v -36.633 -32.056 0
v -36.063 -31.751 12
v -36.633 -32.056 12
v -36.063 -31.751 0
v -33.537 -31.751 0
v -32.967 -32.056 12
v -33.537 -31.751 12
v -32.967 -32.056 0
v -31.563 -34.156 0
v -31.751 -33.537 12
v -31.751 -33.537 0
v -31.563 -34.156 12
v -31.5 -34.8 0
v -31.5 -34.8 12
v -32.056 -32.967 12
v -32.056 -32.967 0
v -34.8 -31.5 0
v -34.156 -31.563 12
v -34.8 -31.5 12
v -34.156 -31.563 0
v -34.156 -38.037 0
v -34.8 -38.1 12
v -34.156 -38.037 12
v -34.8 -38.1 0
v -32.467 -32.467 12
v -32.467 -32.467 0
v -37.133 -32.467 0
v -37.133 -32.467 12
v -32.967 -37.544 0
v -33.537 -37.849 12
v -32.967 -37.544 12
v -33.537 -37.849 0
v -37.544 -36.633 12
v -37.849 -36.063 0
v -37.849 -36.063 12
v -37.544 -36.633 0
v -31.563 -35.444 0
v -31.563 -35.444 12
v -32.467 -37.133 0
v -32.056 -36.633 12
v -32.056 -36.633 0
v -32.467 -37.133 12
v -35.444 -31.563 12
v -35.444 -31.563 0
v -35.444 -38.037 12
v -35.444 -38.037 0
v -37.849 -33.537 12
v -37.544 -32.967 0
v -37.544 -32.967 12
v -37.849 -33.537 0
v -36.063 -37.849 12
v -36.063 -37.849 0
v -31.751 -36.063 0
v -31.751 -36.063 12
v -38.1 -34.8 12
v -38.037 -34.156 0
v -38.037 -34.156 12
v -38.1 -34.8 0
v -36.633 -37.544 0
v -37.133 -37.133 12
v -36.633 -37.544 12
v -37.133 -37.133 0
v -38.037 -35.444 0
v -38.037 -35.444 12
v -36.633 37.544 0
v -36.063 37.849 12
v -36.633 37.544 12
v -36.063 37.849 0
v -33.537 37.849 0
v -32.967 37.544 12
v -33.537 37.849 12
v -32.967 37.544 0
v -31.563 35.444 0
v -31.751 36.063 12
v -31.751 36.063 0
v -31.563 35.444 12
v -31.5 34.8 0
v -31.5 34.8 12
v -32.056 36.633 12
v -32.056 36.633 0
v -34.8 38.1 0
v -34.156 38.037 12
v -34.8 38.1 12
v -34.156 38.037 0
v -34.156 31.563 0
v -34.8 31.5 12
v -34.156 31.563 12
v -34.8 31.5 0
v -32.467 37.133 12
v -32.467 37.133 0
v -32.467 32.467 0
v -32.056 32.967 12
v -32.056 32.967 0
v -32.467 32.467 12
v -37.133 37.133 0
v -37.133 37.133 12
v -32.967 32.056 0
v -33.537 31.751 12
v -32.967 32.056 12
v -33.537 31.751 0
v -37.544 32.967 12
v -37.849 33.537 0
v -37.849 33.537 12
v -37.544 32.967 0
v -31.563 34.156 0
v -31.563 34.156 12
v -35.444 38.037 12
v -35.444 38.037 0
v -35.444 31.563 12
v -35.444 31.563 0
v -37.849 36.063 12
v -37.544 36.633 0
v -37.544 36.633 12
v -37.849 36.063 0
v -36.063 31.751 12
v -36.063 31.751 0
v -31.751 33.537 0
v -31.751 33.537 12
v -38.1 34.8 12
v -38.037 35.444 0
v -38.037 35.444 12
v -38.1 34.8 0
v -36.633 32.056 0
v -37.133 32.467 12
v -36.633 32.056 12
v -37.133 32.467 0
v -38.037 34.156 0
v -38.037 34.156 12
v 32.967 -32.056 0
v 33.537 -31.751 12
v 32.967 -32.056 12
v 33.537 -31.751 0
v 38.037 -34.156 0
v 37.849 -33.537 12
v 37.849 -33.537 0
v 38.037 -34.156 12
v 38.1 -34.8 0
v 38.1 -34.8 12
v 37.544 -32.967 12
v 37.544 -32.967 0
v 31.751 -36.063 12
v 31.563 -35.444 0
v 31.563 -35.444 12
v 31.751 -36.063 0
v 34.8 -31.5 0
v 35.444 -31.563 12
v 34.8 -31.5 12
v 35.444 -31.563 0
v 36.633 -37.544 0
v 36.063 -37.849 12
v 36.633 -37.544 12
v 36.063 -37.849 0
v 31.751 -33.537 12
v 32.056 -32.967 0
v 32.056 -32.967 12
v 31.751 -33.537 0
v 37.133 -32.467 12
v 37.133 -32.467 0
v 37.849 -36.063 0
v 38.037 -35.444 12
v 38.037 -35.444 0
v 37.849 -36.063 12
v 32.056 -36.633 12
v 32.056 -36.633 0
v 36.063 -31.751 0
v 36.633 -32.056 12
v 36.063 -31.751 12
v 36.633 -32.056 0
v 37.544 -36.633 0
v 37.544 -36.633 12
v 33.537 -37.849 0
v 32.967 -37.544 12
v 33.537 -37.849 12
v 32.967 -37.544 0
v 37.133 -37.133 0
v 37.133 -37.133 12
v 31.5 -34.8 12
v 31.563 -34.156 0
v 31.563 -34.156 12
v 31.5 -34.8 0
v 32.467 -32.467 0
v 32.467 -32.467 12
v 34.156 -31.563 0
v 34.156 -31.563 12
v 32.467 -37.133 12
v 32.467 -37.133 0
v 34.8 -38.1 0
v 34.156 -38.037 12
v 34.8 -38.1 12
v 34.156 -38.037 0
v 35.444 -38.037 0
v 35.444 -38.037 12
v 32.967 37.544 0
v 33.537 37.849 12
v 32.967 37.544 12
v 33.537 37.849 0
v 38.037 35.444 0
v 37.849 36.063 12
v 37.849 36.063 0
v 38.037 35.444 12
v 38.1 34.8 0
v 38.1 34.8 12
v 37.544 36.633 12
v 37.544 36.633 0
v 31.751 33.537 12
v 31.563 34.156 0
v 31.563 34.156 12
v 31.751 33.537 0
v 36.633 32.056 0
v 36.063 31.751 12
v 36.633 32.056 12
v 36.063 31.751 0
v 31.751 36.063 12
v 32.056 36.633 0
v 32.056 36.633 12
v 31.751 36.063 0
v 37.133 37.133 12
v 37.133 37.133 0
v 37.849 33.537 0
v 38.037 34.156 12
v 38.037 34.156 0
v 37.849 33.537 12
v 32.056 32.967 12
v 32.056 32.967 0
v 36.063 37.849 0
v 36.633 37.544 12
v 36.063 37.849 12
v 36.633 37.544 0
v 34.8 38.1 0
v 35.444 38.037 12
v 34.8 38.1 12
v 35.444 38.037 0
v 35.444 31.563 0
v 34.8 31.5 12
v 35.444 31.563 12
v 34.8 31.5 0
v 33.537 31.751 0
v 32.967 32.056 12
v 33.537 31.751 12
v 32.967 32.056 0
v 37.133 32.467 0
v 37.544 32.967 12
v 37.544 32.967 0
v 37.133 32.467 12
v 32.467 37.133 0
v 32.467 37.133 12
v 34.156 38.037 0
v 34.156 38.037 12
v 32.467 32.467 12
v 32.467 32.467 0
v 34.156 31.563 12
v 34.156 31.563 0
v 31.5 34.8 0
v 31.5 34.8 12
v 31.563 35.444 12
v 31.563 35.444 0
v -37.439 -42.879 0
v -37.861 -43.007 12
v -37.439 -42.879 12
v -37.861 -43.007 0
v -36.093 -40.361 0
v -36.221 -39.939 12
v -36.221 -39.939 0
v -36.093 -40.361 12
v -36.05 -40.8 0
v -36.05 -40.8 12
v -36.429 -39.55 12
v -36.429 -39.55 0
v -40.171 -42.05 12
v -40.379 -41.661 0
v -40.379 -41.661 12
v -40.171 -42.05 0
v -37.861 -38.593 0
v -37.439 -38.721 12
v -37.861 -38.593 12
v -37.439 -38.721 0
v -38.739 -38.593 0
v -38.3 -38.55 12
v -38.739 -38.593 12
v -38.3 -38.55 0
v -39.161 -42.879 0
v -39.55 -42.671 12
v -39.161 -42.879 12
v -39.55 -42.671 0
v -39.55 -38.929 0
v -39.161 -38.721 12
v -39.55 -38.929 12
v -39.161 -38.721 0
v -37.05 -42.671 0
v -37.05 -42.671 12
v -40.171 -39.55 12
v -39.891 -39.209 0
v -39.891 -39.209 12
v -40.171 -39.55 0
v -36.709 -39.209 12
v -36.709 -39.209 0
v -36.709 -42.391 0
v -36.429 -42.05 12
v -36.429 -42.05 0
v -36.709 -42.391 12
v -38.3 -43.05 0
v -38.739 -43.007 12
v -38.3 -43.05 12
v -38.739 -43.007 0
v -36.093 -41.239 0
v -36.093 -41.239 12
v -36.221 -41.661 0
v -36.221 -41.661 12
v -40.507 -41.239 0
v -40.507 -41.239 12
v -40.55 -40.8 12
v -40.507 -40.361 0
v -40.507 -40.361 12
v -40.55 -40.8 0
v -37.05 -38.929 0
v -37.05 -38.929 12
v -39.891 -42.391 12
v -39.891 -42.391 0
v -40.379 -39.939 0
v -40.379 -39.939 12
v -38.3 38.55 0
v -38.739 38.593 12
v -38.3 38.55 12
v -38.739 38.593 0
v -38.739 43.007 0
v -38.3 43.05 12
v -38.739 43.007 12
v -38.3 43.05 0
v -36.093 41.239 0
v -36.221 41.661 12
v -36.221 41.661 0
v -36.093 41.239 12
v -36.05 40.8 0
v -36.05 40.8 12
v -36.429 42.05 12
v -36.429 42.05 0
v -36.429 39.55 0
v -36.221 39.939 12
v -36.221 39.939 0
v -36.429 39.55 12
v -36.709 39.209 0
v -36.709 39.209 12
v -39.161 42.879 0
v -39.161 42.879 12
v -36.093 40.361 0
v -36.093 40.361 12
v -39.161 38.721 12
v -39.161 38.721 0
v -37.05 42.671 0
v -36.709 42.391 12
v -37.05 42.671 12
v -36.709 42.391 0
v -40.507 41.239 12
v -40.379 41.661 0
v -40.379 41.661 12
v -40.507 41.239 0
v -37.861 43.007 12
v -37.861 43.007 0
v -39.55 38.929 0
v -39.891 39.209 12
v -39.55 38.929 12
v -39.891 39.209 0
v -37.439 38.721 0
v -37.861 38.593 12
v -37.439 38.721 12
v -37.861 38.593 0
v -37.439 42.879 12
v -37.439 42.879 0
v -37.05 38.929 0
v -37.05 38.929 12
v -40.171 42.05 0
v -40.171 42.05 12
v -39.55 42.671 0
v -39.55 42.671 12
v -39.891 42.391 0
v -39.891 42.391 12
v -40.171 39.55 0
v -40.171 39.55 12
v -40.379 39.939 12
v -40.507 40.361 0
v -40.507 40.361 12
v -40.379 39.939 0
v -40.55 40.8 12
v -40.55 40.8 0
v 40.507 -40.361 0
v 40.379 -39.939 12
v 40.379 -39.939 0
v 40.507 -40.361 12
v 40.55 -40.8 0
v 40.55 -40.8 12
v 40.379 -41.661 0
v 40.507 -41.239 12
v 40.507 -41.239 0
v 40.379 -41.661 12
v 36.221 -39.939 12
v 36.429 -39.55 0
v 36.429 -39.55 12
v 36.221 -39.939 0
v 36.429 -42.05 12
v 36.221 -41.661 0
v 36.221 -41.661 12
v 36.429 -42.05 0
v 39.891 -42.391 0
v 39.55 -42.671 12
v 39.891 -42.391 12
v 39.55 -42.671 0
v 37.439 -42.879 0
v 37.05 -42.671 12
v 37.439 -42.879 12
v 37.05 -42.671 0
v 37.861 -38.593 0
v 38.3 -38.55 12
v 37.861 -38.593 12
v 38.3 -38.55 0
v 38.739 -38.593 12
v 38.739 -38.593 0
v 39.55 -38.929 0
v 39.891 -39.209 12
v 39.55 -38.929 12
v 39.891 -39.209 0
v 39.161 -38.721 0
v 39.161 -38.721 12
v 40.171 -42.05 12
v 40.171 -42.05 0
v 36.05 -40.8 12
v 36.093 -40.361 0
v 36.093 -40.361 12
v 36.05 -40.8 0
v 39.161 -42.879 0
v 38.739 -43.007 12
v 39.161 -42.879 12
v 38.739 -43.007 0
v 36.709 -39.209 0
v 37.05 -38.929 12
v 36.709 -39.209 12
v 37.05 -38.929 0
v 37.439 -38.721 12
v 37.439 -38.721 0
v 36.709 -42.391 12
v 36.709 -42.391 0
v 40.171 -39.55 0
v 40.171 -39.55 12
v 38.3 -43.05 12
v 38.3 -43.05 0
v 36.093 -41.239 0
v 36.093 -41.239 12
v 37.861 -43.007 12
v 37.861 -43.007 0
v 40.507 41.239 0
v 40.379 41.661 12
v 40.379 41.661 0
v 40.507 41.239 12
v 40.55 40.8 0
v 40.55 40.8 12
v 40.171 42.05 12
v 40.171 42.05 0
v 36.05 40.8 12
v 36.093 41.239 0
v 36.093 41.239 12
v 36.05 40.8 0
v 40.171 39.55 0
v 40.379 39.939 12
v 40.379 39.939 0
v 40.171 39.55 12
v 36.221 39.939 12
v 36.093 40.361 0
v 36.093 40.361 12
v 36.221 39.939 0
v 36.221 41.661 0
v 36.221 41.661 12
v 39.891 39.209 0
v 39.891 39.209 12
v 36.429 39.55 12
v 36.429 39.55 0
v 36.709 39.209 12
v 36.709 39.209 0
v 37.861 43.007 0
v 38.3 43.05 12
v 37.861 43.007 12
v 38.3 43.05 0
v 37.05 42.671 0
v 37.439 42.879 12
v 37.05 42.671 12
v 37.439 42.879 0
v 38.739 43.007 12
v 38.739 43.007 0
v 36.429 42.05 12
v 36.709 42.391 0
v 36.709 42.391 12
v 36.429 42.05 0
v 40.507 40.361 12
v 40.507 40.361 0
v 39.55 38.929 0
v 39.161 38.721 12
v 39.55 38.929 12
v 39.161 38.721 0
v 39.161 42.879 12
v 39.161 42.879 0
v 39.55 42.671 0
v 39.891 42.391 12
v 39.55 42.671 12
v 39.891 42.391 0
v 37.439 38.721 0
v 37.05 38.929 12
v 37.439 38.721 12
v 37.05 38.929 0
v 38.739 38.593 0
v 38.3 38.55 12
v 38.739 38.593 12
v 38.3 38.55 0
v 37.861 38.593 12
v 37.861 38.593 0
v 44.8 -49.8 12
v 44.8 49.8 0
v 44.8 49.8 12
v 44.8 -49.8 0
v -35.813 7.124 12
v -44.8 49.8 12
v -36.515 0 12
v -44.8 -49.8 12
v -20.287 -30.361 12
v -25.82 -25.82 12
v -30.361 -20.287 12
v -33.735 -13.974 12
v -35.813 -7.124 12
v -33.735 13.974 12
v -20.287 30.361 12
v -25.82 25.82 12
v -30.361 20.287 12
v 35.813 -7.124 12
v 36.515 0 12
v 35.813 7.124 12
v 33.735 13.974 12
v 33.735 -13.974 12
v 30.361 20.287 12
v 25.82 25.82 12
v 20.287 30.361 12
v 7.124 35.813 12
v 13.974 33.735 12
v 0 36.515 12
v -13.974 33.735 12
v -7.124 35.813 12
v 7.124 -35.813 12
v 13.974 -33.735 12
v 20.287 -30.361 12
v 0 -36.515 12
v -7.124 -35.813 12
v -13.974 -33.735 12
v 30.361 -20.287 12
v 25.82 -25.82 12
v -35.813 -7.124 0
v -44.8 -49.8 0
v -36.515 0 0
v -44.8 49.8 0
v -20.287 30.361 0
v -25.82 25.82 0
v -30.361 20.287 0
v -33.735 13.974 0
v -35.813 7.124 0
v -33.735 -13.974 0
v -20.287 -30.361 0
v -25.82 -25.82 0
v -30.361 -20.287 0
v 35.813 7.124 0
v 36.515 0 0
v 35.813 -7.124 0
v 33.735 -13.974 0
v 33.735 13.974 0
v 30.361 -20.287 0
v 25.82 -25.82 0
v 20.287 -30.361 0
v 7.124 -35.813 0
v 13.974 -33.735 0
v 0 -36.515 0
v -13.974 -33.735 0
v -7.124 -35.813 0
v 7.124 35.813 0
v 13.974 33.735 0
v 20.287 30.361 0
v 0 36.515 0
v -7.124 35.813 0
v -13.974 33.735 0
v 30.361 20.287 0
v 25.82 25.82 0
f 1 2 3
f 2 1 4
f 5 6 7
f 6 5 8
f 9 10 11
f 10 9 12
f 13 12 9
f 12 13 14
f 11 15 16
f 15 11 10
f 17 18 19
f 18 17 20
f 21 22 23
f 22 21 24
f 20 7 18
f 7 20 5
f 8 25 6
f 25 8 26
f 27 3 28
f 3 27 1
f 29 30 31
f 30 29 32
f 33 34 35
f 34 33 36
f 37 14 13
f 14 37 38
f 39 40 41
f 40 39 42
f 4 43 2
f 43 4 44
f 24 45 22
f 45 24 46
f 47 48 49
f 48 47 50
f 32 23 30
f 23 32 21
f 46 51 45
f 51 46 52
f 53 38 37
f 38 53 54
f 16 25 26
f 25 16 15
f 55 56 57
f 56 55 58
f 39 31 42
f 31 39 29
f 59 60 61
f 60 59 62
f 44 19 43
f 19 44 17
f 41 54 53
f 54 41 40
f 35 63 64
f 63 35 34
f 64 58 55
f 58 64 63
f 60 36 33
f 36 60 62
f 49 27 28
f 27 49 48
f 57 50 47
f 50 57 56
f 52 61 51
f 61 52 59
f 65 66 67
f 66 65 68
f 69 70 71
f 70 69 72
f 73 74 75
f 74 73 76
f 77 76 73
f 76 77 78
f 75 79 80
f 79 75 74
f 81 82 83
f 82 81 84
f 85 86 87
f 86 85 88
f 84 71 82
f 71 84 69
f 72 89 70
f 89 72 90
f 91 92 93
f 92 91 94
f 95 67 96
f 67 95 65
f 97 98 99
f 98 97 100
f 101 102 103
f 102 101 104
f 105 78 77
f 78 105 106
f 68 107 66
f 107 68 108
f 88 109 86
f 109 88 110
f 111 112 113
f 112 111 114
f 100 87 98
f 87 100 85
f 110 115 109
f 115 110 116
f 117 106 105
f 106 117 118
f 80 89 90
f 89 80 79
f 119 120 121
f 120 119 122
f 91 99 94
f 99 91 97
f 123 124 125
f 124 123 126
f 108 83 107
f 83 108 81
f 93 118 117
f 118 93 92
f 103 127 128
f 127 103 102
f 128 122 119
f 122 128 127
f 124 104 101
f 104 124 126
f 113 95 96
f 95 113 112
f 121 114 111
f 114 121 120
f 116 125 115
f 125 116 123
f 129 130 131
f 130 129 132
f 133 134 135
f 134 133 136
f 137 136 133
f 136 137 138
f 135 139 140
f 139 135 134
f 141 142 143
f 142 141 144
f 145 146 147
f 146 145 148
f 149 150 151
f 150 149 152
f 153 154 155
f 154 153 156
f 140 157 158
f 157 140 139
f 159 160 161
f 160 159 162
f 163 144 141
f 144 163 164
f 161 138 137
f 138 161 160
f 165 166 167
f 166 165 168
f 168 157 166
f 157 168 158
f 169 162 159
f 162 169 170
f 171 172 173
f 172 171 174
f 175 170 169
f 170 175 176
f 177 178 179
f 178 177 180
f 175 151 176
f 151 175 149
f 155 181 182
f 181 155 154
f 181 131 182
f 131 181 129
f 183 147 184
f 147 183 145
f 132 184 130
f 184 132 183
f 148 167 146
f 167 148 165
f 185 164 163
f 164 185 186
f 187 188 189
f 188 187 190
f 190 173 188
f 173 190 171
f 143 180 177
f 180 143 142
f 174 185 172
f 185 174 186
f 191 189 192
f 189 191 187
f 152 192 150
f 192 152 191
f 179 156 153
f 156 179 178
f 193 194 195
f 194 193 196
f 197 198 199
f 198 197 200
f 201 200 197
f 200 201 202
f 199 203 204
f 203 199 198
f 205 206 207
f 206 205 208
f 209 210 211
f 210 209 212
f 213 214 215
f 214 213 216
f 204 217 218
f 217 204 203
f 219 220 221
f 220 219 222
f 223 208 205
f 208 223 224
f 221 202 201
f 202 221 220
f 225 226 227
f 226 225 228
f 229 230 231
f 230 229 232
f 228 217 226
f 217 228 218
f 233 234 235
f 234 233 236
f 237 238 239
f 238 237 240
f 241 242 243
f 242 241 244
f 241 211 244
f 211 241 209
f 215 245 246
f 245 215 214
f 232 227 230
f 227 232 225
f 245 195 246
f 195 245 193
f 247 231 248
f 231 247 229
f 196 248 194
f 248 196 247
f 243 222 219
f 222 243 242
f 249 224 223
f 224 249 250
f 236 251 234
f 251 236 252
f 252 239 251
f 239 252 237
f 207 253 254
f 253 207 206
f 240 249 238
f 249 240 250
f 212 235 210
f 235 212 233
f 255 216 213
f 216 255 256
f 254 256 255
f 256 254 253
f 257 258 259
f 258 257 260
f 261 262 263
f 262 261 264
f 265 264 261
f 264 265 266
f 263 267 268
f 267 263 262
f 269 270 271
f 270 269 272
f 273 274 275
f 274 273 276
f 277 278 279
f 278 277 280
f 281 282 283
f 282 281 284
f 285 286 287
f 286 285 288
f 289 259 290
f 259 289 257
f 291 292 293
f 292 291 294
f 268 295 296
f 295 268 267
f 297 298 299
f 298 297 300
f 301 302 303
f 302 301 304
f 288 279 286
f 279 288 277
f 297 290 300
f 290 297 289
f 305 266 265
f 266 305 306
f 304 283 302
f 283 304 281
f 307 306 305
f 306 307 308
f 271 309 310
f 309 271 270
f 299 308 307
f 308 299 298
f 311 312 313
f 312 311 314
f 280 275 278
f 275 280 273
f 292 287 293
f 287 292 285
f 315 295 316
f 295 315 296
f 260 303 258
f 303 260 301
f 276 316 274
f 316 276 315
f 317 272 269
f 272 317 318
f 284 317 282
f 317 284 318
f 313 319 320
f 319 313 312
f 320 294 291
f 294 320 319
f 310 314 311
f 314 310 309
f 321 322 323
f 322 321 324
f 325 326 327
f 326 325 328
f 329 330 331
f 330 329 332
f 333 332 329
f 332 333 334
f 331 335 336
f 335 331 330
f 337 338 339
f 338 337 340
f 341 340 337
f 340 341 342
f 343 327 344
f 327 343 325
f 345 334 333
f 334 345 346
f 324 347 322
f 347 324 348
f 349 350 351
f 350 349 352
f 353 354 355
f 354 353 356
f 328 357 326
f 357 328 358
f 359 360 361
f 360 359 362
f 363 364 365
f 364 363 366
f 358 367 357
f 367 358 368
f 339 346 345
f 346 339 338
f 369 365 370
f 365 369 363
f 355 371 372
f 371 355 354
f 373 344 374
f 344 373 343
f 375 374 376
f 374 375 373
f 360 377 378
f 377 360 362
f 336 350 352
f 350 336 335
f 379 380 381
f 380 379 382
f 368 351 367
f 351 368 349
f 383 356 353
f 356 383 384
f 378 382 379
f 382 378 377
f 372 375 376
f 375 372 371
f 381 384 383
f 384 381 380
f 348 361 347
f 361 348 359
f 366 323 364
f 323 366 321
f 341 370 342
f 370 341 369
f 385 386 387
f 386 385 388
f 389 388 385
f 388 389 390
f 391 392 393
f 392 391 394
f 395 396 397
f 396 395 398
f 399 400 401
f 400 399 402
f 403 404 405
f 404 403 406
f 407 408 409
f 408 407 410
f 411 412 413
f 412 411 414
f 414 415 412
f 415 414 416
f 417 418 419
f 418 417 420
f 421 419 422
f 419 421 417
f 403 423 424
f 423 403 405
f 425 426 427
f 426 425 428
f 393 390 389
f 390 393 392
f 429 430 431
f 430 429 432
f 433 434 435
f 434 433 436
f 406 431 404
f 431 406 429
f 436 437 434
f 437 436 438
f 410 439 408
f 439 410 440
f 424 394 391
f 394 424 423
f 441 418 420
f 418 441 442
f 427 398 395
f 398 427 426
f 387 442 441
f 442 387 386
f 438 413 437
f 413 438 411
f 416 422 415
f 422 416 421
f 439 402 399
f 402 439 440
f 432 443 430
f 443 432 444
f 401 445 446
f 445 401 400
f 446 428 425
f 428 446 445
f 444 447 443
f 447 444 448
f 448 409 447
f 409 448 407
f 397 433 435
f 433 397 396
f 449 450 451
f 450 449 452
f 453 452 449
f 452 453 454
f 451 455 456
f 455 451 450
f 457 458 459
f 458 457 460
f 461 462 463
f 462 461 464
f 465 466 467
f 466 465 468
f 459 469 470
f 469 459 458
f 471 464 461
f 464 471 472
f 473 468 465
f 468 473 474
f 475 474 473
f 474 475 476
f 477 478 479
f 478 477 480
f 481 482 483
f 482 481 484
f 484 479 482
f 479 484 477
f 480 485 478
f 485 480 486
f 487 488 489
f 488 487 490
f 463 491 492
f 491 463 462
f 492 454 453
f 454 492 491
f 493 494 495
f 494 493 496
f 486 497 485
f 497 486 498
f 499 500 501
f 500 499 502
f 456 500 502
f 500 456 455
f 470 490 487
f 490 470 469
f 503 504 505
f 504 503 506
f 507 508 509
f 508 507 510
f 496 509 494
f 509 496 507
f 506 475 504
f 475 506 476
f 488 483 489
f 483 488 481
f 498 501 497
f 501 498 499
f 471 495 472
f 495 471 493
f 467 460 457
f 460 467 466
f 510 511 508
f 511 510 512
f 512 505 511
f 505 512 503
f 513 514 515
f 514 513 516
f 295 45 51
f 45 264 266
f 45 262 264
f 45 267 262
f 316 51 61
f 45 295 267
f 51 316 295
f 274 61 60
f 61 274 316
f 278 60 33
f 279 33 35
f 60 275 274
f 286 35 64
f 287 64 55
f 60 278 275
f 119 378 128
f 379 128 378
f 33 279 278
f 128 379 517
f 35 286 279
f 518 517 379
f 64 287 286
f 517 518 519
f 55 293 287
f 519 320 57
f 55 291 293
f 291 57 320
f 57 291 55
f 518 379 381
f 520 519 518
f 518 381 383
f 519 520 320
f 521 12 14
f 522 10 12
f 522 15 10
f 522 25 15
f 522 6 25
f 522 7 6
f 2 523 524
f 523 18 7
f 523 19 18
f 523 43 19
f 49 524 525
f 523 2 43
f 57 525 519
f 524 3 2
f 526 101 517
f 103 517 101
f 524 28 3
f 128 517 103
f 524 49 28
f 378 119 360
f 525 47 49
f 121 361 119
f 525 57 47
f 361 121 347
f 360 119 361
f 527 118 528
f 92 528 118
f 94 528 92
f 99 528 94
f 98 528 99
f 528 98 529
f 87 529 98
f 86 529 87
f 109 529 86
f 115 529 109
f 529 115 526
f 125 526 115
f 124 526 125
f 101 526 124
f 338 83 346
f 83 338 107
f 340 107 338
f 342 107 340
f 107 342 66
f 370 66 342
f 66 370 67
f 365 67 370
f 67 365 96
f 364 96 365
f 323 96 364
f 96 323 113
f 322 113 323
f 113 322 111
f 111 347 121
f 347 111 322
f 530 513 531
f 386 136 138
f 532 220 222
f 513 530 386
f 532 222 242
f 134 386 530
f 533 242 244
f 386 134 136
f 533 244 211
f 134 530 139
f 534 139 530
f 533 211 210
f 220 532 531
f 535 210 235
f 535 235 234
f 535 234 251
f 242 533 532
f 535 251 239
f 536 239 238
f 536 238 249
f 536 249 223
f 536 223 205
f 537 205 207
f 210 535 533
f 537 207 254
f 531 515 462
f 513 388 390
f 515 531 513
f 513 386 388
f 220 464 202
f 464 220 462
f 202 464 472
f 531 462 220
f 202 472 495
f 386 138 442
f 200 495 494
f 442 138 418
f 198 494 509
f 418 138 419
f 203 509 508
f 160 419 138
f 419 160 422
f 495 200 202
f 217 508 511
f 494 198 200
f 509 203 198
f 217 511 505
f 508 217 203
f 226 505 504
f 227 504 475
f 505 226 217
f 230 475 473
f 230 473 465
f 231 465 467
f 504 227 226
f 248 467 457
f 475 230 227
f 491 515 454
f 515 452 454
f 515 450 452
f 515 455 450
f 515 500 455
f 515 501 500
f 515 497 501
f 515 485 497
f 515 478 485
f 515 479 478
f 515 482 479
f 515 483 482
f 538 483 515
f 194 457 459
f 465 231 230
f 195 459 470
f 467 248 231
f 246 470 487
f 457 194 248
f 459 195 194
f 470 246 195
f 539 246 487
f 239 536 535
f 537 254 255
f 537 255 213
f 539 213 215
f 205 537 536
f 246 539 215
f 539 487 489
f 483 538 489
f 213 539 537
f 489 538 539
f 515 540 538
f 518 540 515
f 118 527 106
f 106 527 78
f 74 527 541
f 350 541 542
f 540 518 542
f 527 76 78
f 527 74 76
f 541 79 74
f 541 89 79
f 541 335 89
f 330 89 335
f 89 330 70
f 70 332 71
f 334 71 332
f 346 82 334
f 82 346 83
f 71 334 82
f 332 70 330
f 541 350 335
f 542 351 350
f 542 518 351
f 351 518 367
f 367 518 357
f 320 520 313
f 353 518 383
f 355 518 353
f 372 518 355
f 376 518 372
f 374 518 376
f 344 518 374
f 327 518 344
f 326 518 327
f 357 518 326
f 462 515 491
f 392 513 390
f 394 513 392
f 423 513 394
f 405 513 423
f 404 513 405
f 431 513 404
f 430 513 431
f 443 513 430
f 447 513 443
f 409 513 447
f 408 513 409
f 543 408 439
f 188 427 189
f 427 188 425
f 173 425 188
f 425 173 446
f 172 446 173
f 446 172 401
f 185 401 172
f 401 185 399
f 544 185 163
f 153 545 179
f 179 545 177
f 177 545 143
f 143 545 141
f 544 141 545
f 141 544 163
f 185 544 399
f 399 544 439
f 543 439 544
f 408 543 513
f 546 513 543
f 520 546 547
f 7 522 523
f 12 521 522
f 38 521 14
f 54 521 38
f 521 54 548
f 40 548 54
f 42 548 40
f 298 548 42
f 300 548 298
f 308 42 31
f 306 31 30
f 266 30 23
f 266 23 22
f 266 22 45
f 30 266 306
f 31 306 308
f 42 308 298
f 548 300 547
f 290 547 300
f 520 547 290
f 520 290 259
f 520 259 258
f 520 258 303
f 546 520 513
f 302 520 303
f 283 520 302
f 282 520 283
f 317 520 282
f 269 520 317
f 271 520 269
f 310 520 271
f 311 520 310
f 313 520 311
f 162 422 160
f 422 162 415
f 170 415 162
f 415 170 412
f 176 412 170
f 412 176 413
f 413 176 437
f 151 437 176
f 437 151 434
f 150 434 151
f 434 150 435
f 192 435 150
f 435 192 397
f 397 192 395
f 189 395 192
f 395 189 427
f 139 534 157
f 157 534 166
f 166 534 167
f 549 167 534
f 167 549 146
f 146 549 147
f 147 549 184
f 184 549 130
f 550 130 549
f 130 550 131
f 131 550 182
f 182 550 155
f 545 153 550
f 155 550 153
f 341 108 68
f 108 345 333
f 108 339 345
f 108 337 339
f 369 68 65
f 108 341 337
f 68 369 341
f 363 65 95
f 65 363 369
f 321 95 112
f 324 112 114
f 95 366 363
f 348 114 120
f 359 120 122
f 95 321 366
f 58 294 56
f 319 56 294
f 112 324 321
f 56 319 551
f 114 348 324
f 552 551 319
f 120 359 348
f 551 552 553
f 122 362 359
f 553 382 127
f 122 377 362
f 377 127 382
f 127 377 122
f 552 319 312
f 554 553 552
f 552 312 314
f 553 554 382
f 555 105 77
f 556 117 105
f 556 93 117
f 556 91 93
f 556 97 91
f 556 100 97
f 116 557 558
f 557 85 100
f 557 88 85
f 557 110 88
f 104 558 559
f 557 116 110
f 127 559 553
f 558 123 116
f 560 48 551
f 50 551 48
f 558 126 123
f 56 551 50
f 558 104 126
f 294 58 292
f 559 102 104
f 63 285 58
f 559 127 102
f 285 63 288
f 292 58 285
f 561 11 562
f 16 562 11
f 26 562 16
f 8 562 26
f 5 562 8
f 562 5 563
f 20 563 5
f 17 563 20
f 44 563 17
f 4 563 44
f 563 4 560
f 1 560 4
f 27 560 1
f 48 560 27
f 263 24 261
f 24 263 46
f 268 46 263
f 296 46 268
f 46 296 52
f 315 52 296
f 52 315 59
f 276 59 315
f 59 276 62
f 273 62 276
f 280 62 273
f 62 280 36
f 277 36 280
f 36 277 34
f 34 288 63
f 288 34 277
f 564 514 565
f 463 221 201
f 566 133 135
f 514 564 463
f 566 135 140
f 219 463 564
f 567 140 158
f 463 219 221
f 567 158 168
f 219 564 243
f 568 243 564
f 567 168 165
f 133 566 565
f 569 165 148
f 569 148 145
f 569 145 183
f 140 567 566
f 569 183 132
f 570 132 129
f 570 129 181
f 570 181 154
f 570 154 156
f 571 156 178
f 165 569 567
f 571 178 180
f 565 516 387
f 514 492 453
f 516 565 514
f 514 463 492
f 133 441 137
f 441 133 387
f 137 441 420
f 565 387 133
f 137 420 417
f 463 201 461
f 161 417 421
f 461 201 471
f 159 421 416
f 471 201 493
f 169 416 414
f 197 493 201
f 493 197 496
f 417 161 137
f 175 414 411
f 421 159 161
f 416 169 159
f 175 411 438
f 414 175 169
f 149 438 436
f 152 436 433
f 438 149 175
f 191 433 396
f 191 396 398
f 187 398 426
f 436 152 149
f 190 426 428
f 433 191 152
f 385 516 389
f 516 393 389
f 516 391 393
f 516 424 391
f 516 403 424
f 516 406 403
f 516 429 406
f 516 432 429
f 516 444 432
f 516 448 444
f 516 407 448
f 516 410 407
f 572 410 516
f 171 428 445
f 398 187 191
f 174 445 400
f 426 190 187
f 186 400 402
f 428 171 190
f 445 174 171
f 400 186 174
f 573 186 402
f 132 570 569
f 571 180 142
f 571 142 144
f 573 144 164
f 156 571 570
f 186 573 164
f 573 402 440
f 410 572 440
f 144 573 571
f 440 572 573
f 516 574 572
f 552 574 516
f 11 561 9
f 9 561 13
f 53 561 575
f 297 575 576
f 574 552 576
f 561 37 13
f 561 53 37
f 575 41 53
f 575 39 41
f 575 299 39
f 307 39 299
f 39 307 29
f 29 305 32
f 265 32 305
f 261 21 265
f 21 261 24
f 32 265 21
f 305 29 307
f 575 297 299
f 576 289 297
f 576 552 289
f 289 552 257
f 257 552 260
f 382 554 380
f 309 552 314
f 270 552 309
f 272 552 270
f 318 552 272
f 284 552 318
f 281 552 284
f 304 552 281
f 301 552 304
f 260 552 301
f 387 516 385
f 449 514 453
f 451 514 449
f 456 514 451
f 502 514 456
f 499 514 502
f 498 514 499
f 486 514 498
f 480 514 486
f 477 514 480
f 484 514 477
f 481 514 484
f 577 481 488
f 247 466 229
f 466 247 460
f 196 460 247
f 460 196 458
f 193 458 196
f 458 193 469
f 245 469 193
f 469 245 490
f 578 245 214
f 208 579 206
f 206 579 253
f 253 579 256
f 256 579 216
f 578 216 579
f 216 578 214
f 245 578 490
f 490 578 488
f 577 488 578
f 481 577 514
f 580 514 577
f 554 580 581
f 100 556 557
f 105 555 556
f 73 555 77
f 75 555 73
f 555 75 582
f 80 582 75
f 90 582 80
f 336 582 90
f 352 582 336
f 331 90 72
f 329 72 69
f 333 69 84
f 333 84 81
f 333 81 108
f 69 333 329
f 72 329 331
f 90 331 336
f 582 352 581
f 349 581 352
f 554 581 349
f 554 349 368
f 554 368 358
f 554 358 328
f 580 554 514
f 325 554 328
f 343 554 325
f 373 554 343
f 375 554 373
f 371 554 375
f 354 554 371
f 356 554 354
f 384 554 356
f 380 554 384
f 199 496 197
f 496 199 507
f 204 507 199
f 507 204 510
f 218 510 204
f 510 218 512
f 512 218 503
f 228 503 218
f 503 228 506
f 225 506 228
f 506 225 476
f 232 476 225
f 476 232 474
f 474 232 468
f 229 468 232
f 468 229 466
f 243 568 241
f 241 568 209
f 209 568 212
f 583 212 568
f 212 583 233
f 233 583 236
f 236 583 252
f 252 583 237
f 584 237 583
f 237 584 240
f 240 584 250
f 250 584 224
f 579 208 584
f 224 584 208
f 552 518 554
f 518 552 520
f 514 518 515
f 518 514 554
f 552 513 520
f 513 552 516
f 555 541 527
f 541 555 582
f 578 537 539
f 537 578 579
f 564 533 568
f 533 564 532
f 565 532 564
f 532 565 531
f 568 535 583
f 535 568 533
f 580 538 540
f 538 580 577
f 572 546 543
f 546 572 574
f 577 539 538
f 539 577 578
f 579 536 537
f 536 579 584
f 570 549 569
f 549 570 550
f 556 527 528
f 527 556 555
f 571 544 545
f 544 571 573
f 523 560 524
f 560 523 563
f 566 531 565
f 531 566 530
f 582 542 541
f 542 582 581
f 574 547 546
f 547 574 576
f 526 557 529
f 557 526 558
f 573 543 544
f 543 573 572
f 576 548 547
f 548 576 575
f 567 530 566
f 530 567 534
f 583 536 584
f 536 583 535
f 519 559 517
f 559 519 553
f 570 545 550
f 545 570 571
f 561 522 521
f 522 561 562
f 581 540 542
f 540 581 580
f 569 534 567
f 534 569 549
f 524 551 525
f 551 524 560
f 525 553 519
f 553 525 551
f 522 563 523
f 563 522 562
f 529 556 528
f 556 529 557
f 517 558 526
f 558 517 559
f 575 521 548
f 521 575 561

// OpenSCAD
$fn = 32;

// ----------------------------------------------------------------------
// Motor mount plate: NEMA34, 89.6 x 99.6 x 12 mm
// ----------------------------------------------------------------------

// --- parameters (mm) ---
plate_w = 89.6;           // plate length, X
plate_d = 99.6;           // plate width, Y
plate_t = 12;             // plate thickness
pattern = 69.6;           // NEMA34 bolt spacing
motor_d = 6.6;            // NEMA34 screw clearance
pilot_d = 73.03;          // pilot boss bore
second_d = 4.5;           // second fastener hole

module plate() {
  translate([-plate_w / 2, -plate_d / 2, 0]) cube([plate_w, plate_d, plate_t]);
}

module motor_holes() {
  for (sx = [-1, 1]) for (sy = [-1, 1])
    translate([sx * pattern / 2, sy * pattern / 2, -1])
      cylinder(h = plate_t + 2, d = motor_d);
}

difference() {
  union() {
    plate();
  }
  motor_holes();
  translate([0, 0, -1]) cylinder(h = plate_t + 2, d = pilot_d);
  for (sx = [-1, 1]) for (sy = [-1, 1])
    translate([sx * 38.3, sy * 40.8, -1]) cylinder(h = plate_t + 2, d = second_d);
}
